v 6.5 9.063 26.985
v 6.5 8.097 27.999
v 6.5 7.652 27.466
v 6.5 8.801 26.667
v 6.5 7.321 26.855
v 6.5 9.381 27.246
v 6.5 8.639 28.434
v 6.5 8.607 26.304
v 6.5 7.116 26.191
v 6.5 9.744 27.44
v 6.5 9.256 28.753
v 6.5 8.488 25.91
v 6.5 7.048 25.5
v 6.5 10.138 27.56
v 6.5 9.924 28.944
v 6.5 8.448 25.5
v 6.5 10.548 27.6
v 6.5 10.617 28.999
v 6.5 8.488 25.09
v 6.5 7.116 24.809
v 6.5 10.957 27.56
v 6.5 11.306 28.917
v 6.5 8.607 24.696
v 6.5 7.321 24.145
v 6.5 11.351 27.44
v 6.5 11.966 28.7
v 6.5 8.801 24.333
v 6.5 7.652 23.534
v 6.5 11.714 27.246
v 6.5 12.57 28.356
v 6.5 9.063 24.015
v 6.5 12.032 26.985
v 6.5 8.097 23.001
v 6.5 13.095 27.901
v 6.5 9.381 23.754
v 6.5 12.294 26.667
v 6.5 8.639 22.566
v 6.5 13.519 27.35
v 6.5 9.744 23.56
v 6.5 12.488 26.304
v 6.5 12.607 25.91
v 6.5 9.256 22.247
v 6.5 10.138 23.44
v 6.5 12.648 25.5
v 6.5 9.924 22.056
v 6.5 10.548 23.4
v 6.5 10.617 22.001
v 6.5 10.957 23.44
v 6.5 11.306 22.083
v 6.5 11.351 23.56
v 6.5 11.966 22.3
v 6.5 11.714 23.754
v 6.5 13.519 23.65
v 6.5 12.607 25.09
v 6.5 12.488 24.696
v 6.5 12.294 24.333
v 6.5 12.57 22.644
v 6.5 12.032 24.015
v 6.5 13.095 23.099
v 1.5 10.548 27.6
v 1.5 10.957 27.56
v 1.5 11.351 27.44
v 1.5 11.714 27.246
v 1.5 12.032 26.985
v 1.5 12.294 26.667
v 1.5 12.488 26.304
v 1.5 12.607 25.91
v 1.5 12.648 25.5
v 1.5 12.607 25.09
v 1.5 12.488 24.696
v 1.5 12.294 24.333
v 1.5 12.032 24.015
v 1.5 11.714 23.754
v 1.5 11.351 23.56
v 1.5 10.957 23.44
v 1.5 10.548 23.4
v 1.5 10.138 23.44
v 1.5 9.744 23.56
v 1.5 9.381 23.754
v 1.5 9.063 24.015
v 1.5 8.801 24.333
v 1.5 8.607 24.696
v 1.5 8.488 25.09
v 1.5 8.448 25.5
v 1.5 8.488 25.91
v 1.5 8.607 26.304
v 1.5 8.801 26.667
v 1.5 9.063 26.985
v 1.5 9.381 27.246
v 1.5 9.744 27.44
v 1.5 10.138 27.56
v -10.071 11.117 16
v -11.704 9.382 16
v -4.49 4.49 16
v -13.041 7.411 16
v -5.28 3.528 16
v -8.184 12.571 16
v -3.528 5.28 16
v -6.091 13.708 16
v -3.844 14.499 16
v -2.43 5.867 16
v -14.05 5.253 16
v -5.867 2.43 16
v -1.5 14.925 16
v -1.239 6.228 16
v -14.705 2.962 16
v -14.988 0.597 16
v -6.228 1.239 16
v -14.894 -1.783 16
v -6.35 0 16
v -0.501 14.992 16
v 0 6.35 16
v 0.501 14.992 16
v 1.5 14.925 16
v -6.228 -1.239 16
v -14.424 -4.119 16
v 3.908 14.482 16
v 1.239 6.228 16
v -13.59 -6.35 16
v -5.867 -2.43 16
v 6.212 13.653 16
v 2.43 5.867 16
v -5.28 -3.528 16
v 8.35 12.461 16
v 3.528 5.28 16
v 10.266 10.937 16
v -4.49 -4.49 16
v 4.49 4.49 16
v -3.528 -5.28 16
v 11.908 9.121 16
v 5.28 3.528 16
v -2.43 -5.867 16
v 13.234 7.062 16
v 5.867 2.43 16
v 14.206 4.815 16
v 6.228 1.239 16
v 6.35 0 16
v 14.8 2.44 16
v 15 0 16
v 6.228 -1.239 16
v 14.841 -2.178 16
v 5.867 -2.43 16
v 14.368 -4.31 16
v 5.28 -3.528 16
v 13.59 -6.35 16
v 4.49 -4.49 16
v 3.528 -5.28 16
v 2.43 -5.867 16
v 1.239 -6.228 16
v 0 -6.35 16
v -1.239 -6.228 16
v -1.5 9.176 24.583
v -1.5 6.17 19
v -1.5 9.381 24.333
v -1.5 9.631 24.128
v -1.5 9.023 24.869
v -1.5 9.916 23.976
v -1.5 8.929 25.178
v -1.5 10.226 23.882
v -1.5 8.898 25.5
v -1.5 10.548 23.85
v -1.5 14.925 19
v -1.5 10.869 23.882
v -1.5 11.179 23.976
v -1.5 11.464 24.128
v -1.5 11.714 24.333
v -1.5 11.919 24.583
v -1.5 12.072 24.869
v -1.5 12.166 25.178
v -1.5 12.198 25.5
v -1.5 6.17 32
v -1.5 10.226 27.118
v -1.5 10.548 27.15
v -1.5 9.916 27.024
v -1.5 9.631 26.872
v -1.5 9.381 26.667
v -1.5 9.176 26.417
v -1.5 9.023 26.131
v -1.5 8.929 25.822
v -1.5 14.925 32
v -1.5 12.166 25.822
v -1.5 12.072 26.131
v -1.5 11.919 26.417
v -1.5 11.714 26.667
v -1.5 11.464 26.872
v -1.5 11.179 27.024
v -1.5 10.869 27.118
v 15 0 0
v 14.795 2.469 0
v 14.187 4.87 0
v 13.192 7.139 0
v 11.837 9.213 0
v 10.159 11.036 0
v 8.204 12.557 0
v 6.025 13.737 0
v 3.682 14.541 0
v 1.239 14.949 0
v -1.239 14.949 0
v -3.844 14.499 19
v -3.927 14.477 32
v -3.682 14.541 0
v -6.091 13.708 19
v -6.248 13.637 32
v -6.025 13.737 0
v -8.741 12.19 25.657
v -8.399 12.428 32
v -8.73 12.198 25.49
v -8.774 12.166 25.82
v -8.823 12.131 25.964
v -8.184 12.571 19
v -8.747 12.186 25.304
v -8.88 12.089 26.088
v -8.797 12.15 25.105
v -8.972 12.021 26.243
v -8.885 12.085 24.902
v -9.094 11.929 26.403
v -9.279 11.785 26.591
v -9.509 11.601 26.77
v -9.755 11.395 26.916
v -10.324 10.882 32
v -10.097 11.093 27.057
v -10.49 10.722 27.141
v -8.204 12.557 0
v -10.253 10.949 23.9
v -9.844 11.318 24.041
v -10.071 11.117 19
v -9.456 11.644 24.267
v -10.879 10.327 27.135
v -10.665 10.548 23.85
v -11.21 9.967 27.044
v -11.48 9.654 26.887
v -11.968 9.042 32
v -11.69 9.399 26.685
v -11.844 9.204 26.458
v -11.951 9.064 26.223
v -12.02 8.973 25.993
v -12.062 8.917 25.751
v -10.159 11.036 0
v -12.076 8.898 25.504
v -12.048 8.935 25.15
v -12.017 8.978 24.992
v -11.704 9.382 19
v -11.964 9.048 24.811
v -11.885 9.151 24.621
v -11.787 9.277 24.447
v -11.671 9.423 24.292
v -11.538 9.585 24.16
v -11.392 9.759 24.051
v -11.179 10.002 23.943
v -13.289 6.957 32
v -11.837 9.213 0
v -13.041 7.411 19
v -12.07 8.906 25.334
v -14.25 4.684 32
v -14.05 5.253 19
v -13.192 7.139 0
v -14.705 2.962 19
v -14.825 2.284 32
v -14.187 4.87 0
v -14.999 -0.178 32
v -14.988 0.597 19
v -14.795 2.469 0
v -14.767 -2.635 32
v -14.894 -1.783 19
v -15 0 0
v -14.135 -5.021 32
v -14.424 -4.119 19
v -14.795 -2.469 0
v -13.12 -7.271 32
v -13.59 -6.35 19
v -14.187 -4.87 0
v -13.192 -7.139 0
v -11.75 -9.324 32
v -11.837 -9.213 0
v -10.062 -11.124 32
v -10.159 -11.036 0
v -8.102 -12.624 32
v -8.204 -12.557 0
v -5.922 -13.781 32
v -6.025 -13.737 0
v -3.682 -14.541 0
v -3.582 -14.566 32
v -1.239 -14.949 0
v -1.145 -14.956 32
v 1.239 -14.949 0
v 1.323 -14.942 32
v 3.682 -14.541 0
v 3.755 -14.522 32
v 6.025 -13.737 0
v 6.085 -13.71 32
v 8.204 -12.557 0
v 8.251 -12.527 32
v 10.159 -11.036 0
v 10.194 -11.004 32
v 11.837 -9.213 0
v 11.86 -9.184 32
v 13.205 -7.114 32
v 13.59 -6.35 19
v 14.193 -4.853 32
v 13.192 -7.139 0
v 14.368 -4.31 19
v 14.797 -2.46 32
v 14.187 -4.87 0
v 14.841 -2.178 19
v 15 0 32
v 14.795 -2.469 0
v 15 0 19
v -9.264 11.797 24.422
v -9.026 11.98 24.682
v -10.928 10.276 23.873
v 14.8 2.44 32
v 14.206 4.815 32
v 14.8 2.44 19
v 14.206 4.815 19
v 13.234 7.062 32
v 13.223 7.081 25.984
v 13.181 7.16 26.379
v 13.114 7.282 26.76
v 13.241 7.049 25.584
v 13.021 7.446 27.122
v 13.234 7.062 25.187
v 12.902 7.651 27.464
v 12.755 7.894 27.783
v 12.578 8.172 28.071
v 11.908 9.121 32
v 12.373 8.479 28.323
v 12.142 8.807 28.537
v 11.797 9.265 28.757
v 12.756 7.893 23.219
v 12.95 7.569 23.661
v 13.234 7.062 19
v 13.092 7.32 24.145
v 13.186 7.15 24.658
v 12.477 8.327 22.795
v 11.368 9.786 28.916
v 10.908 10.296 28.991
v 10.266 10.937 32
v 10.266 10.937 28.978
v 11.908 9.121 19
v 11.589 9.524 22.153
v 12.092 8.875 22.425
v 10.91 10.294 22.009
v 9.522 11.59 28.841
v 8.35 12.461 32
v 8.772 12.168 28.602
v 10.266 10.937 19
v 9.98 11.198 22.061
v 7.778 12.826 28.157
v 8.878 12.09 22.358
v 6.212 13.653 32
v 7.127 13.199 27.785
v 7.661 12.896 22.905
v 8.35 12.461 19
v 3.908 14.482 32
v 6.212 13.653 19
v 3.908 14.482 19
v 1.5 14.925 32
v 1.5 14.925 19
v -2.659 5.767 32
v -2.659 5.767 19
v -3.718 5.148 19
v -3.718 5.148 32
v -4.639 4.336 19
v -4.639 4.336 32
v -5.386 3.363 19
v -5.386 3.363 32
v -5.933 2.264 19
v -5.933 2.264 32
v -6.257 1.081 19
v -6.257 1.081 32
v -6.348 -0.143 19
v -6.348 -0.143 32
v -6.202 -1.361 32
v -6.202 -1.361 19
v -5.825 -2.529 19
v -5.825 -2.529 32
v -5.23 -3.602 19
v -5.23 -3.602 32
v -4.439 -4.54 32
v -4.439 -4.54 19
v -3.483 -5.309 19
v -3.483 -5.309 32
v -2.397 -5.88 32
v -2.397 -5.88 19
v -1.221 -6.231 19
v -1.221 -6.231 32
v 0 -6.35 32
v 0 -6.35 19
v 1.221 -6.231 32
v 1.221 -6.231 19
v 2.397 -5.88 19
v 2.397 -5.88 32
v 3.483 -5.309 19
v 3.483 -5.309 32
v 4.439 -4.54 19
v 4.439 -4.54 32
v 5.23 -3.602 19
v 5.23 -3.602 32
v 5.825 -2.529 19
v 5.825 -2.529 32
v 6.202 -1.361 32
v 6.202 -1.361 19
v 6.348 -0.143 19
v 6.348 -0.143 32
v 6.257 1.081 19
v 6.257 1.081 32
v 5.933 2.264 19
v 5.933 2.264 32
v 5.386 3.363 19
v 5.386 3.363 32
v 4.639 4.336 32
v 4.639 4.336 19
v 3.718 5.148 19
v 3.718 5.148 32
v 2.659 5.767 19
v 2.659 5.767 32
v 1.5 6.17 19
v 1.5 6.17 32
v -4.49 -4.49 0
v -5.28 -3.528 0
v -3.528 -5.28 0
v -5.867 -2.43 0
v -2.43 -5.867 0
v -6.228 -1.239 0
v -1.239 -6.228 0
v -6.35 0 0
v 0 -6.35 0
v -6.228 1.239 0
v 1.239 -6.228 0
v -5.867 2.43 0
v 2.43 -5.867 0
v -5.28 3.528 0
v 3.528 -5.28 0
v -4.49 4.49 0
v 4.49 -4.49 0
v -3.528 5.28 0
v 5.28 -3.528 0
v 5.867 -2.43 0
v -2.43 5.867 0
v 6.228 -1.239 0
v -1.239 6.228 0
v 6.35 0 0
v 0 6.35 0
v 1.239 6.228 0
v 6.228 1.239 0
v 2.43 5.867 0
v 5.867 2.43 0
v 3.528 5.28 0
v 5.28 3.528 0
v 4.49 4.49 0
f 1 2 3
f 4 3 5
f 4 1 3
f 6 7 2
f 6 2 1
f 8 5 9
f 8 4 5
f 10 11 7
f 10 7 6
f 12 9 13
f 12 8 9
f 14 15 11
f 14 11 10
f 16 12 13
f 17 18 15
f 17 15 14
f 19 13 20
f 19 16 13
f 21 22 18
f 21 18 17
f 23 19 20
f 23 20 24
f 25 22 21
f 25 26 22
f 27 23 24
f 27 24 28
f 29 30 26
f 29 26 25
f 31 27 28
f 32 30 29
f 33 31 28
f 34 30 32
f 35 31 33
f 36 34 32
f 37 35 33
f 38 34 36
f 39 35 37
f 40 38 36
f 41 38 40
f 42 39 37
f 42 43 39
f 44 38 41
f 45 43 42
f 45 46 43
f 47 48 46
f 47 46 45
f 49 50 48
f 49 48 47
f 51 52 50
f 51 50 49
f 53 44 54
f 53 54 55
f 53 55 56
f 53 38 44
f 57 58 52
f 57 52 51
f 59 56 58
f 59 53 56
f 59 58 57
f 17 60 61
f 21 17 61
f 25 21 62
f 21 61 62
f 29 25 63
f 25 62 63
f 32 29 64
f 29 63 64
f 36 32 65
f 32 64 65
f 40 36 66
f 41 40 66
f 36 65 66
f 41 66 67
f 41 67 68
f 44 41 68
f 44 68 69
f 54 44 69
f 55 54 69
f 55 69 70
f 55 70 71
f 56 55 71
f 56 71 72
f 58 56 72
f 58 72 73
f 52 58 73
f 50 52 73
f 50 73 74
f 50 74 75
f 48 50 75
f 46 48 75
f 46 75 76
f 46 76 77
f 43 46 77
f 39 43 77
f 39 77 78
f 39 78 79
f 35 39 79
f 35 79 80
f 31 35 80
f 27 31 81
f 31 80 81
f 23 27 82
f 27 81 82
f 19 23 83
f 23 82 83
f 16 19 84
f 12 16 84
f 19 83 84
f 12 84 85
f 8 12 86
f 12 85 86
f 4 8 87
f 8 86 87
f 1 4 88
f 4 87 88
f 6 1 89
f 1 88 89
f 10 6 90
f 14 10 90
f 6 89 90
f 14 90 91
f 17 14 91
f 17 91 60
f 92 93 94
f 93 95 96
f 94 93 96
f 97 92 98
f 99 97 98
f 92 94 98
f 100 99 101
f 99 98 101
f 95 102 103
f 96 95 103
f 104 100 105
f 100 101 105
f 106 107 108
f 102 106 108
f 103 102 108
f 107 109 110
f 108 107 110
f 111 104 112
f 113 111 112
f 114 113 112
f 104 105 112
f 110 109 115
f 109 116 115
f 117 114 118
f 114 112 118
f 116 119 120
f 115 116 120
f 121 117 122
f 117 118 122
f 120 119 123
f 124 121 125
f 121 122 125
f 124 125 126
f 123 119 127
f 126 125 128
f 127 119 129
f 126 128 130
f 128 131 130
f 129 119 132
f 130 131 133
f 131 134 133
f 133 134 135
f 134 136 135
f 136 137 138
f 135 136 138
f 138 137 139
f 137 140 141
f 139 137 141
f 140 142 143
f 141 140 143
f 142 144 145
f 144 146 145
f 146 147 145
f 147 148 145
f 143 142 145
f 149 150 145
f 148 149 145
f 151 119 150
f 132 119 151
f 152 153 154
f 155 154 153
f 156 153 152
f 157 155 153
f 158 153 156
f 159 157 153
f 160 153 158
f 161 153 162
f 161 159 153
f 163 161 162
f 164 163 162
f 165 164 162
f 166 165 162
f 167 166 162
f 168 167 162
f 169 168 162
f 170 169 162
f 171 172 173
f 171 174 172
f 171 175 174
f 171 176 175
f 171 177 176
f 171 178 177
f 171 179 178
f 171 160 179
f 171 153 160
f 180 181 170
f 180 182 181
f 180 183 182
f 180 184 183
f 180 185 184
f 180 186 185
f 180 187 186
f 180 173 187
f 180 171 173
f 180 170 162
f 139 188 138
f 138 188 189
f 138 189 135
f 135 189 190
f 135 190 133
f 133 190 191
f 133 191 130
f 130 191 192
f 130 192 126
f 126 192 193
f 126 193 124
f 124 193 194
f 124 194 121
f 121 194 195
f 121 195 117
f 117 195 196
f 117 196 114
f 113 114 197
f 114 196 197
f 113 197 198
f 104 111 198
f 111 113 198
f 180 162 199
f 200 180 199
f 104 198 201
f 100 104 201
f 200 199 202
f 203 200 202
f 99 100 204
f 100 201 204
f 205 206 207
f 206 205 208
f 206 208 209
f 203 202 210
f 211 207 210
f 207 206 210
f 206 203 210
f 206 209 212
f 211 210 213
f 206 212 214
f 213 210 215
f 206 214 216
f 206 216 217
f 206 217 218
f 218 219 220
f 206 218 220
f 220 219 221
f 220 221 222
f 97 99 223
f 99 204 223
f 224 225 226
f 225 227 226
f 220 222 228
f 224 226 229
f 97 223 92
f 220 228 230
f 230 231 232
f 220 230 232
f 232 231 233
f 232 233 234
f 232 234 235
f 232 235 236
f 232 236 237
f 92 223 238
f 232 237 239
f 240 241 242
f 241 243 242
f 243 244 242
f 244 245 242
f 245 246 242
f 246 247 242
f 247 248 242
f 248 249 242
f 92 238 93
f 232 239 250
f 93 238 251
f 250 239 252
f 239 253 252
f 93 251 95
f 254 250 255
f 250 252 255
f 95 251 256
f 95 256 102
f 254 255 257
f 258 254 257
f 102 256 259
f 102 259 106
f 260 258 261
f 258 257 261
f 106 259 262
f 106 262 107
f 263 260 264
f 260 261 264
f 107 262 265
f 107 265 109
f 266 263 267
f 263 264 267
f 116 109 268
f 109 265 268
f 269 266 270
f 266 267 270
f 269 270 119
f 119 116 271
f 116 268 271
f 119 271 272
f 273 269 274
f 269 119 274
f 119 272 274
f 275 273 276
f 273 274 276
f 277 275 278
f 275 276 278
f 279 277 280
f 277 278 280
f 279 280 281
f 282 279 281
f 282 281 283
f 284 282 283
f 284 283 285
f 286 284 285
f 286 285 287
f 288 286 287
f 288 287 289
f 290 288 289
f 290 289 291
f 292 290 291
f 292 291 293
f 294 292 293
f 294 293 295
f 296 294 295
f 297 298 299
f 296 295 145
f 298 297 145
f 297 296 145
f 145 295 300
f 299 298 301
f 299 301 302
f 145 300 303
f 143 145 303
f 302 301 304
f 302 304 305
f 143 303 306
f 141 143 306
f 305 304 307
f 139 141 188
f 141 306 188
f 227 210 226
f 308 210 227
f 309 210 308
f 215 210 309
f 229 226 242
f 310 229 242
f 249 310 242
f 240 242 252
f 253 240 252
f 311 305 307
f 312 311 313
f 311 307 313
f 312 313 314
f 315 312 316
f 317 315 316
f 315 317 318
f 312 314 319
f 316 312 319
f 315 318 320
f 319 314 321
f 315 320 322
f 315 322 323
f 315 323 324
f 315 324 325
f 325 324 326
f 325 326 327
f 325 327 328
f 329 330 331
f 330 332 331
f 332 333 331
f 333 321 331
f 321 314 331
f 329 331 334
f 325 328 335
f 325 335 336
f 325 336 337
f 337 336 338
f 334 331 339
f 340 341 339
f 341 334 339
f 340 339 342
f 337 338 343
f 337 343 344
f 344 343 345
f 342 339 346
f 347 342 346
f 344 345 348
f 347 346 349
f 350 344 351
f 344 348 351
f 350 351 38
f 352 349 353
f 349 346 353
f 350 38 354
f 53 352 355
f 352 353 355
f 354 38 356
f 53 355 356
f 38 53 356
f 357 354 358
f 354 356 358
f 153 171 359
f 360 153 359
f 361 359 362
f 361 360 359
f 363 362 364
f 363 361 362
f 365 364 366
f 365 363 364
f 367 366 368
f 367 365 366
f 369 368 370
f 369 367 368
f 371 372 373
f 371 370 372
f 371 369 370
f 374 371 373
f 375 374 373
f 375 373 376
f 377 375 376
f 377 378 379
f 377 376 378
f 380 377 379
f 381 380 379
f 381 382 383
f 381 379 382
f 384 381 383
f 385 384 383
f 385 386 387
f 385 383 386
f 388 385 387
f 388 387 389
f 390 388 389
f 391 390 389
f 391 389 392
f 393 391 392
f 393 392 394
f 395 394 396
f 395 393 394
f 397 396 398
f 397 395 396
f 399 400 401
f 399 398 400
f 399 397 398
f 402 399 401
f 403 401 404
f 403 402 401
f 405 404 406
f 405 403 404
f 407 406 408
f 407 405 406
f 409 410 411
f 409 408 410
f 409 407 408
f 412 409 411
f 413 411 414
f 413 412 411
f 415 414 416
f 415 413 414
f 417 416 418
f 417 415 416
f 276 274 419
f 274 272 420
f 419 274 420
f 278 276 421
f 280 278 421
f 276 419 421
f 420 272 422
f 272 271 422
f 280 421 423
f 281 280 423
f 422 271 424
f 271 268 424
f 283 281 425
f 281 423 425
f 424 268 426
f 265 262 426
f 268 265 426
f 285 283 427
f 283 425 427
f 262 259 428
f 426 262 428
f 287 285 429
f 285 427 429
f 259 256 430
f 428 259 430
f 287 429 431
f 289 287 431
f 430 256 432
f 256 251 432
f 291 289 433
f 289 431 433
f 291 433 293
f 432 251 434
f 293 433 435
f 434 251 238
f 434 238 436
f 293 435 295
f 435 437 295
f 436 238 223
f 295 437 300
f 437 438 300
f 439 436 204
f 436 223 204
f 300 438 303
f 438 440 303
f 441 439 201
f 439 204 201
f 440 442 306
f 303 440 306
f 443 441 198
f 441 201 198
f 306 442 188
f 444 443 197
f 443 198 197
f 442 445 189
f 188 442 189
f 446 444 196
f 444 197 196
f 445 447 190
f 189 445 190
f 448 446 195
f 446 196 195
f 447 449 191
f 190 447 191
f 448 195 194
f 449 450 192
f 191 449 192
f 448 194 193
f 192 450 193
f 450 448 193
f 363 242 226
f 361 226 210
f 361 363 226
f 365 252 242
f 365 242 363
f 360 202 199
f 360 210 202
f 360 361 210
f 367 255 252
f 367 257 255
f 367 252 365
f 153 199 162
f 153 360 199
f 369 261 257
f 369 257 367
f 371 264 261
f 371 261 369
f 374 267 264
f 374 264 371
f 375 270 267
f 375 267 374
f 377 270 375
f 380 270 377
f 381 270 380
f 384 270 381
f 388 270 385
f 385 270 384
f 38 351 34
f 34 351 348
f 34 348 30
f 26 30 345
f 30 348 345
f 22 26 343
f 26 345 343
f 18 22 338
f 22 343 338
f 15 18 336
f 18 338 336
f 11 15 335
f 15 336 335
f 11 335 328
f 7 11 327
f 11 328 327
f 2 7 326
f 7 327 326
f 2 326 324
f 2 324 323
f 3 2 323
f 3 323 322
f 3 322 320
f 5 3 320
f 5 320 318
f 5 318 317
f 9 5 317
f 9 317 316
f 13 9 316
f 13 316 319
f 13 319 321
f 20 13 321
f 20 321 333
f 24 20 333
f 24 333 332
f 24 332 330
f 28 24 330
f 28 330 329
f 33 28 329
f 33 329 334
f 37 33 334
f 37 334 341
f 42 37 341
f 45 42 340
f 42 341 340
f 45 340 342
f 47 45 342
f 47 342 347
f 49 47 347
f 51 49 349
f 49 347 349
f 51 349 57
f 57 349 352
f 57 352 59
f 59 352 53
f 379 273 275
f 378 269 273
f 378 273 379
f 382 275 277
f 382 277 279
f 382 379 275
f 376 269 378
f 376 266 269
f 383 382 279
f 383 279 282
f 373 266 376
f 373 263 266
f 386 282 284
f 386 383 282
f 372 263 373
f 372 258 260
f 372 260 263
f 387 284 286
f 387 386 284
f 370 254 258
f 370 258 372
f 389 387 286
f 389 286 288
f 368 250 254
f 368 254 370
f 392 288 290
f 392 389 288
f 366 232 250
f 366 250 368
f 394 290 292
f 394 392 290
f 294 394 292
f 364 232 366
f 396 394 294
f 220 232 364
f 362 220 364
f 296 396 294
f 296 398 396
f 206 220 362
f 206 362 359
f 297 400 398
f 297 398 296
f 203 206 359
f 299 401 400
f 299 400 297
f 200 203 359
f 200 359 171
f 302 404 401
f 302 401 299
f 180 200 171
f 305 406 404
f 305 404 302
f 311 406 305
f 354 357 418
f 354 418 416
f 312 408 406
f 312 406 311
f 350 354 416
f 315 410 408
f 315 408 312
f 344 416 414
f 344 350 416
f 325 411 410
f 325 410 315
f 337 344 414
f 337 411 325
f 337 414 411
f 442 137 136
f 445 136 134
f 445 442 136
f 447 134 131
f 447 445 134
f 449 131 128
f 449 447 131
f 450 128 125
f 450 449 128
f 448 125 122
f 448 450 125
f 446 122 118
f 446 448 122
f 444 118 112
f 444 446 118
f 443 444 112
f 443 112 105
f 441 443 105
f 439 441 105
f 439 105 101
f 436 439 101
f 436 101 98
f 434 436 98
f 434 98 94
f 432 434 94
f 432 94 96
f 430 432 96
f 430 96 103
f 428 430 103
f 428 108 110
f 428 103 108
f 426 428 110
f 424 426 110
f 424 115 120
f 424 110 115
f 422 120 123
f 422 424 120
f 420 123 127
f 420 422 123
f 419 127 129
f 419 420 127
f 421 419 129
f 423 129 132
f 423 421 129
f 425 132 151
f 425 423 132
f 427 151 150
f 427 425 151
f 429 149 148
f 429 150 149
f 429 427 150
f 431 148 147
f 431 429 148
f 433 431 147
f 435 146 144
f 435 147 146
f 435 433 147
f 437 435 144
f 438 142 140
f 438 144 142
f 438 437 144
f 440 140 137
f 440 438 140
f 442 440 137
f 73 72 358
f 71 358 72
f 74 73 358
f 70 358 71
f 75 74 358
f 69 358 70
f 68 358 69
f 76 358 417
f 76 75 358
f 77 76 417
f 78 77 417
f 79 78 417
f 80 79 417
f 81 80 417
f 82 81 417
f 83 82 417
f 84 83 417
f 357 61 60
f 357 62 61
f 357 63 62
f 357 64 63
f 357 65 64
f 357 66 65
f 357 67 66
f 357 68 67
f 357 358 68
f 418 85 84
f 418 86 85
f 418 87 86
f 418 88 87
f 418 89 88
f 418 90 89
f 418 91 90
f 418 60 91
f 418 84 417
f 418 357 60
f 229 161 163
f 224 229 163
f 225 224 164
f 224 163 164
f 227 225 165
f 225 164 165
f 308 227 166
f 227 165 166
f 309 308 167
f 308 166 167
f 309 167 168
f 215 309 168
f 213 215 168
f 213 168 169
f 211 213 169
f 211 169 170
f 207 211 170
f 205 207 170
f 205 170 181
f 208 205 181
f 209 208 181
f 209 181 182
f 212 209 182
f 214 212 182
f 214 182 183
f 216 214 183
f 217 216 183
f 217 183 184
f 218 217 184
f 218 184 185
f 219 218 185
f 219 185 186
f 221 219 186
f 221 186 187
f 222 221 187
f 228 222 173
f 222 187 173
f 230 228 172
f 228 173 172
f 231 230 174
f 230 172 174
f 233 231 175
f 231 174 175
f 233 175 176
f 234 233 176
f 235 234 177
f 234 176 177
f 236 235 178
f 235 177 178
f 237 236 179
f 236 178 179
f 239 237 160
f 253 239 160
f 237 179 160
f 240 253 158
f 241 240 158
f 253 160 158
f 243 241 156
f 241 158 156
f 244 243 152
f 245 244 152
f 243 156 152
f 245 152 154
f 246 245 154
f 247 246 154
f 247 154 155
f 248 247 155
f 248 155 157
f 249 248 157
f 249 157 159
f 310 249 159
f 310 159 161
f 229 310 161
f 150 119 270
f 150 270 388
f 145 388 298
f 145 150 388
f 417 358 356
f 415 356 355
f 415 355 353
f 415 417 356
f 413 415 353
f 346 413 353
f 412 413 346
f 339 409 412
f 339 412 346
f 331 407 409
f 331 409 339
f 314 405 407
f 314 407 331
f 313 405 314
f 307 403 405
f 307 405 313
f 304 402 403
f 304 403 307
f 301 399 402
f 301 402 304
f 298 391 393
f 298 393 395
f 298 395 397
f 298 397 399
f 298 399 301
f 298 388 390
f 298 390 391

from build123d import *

# Parameters (mm, degrees)
SKETCH1_R               = 15
SKETCH1_R_2             = 6.35
BOSS_EXTRUDE1_DEPTH     = 32
CUT_EXTRUDE1_DEPTH      = 16
CUT_EXTRUDE2_START      = -21.35
SKETCH3_W               = 30
SKETCH3_H               = 3
CUT_EXTRUDE2_DEPTH      = 21.274812
SKETCH4_R               = 1.65
CUT_EXTRUDE3_DEPTH      = 17.5
CUT_EXTRUDE3_DEPTH_BACK = 14.5
SKETCH5_R               = 2.1
CUT_EXTRUDE4_DEPTH      = 14.5000001
SKETCH6_R               = 3.5
CUT_EXTRUDE5_DEPTH      = 8.5


with BuildPart() as part:
    # Sketch1 → Boss-Extrude1 (new body)
    with BuildSketch(Plane.XY):
        Circle(SKETCH1_R)
        Circle(SKETCH1_R_2, mode=Mode.SUBTRACT)
    extrude(amount=BOSS_EXTRUDE1_DEPTH)

    # Sketch2 → Cut-Extrude1 (cut)
    with BuildSketch(Plane.XY.offset(32)):
        with BuildLine():
            Line((-1.5, 6.170291727), (-1.5, 14.924811557))
            ThreePointArc((-1.5, 14.924811557), (0, 16.424811557), (1.5, 14.924811557))
            Line((1.5, 14.924811557), (1.5, 6.170291727))
            ThreePointArc((1.5, 6.170291727), (0, 4.670291727), (-1.5, 6.170291727))
        make_face()
    extrude(amount=-CUT_EXTRUDE1_DEPTH, mode=Mode.SUBTRACT)

    # Sketch3 → Cut-Extrude2 (cut)
    with BuildSketch(Plane(origin=(0, 15, 0), x_dir=(1, 0, 0), z_dir=(0, 1, 0)).offset(CUT_EXTRUDE2_START)):
        with Locations((0, -17.5)):
            Rectangle(SKETCH3_W, SKETCH3_H)
    extrude(amount=CUT_EXTRUDE2_DEPTH, mode=Mode.SUBTRACT)

    # Sketch4 → Cut-Extrude3 (cut, two sides)
    with BuildSketch(Plane(origin=(-1.5, 0, 0), x_dir=(0, 0, -1), z_dir=(1, 0, 0))) as cut_extrude3_sk:
        with Locations((-25.5, 10.547551642)):
            Circle(SKETCH4_R)
    extrude(amount=CUT_EXTRUDE3_DEPTH, mode=Mode.SUBTRACT)
    extrude(cut_extrude3_sk.sketch, amount=-CUT_EXTRUDE3_DEPTH_BACK, mode=Mode.SUBTRACT)

    # Sketch5 → Cut-Extrude4 (cut, through all)
    with BuildSketch(Plane.ZY.offset(-1.5)):
        with Locations((25.5, 10.547551642)):
            Circle(SKETCH5_R)
    extrude(amount=-CUT_EXTRUDE4_DEPTH, mode=Mode.SUBTRACT)

    # Sketch6 → Cut-Extrude5 (cut)
    with BuildSketch(Plane(origin=(15, 0, 0), x_dir=(0, 0, -1), z_dir=(1, 0, 0))):
        with Locations((-25.5, 10.547551642)):
            Circle(SKETCH6_R)
    extrude(amount=-CUT_EXTRUDE5_DEPTH, mode=Mode.SUBTRACT)


solid = part.part
